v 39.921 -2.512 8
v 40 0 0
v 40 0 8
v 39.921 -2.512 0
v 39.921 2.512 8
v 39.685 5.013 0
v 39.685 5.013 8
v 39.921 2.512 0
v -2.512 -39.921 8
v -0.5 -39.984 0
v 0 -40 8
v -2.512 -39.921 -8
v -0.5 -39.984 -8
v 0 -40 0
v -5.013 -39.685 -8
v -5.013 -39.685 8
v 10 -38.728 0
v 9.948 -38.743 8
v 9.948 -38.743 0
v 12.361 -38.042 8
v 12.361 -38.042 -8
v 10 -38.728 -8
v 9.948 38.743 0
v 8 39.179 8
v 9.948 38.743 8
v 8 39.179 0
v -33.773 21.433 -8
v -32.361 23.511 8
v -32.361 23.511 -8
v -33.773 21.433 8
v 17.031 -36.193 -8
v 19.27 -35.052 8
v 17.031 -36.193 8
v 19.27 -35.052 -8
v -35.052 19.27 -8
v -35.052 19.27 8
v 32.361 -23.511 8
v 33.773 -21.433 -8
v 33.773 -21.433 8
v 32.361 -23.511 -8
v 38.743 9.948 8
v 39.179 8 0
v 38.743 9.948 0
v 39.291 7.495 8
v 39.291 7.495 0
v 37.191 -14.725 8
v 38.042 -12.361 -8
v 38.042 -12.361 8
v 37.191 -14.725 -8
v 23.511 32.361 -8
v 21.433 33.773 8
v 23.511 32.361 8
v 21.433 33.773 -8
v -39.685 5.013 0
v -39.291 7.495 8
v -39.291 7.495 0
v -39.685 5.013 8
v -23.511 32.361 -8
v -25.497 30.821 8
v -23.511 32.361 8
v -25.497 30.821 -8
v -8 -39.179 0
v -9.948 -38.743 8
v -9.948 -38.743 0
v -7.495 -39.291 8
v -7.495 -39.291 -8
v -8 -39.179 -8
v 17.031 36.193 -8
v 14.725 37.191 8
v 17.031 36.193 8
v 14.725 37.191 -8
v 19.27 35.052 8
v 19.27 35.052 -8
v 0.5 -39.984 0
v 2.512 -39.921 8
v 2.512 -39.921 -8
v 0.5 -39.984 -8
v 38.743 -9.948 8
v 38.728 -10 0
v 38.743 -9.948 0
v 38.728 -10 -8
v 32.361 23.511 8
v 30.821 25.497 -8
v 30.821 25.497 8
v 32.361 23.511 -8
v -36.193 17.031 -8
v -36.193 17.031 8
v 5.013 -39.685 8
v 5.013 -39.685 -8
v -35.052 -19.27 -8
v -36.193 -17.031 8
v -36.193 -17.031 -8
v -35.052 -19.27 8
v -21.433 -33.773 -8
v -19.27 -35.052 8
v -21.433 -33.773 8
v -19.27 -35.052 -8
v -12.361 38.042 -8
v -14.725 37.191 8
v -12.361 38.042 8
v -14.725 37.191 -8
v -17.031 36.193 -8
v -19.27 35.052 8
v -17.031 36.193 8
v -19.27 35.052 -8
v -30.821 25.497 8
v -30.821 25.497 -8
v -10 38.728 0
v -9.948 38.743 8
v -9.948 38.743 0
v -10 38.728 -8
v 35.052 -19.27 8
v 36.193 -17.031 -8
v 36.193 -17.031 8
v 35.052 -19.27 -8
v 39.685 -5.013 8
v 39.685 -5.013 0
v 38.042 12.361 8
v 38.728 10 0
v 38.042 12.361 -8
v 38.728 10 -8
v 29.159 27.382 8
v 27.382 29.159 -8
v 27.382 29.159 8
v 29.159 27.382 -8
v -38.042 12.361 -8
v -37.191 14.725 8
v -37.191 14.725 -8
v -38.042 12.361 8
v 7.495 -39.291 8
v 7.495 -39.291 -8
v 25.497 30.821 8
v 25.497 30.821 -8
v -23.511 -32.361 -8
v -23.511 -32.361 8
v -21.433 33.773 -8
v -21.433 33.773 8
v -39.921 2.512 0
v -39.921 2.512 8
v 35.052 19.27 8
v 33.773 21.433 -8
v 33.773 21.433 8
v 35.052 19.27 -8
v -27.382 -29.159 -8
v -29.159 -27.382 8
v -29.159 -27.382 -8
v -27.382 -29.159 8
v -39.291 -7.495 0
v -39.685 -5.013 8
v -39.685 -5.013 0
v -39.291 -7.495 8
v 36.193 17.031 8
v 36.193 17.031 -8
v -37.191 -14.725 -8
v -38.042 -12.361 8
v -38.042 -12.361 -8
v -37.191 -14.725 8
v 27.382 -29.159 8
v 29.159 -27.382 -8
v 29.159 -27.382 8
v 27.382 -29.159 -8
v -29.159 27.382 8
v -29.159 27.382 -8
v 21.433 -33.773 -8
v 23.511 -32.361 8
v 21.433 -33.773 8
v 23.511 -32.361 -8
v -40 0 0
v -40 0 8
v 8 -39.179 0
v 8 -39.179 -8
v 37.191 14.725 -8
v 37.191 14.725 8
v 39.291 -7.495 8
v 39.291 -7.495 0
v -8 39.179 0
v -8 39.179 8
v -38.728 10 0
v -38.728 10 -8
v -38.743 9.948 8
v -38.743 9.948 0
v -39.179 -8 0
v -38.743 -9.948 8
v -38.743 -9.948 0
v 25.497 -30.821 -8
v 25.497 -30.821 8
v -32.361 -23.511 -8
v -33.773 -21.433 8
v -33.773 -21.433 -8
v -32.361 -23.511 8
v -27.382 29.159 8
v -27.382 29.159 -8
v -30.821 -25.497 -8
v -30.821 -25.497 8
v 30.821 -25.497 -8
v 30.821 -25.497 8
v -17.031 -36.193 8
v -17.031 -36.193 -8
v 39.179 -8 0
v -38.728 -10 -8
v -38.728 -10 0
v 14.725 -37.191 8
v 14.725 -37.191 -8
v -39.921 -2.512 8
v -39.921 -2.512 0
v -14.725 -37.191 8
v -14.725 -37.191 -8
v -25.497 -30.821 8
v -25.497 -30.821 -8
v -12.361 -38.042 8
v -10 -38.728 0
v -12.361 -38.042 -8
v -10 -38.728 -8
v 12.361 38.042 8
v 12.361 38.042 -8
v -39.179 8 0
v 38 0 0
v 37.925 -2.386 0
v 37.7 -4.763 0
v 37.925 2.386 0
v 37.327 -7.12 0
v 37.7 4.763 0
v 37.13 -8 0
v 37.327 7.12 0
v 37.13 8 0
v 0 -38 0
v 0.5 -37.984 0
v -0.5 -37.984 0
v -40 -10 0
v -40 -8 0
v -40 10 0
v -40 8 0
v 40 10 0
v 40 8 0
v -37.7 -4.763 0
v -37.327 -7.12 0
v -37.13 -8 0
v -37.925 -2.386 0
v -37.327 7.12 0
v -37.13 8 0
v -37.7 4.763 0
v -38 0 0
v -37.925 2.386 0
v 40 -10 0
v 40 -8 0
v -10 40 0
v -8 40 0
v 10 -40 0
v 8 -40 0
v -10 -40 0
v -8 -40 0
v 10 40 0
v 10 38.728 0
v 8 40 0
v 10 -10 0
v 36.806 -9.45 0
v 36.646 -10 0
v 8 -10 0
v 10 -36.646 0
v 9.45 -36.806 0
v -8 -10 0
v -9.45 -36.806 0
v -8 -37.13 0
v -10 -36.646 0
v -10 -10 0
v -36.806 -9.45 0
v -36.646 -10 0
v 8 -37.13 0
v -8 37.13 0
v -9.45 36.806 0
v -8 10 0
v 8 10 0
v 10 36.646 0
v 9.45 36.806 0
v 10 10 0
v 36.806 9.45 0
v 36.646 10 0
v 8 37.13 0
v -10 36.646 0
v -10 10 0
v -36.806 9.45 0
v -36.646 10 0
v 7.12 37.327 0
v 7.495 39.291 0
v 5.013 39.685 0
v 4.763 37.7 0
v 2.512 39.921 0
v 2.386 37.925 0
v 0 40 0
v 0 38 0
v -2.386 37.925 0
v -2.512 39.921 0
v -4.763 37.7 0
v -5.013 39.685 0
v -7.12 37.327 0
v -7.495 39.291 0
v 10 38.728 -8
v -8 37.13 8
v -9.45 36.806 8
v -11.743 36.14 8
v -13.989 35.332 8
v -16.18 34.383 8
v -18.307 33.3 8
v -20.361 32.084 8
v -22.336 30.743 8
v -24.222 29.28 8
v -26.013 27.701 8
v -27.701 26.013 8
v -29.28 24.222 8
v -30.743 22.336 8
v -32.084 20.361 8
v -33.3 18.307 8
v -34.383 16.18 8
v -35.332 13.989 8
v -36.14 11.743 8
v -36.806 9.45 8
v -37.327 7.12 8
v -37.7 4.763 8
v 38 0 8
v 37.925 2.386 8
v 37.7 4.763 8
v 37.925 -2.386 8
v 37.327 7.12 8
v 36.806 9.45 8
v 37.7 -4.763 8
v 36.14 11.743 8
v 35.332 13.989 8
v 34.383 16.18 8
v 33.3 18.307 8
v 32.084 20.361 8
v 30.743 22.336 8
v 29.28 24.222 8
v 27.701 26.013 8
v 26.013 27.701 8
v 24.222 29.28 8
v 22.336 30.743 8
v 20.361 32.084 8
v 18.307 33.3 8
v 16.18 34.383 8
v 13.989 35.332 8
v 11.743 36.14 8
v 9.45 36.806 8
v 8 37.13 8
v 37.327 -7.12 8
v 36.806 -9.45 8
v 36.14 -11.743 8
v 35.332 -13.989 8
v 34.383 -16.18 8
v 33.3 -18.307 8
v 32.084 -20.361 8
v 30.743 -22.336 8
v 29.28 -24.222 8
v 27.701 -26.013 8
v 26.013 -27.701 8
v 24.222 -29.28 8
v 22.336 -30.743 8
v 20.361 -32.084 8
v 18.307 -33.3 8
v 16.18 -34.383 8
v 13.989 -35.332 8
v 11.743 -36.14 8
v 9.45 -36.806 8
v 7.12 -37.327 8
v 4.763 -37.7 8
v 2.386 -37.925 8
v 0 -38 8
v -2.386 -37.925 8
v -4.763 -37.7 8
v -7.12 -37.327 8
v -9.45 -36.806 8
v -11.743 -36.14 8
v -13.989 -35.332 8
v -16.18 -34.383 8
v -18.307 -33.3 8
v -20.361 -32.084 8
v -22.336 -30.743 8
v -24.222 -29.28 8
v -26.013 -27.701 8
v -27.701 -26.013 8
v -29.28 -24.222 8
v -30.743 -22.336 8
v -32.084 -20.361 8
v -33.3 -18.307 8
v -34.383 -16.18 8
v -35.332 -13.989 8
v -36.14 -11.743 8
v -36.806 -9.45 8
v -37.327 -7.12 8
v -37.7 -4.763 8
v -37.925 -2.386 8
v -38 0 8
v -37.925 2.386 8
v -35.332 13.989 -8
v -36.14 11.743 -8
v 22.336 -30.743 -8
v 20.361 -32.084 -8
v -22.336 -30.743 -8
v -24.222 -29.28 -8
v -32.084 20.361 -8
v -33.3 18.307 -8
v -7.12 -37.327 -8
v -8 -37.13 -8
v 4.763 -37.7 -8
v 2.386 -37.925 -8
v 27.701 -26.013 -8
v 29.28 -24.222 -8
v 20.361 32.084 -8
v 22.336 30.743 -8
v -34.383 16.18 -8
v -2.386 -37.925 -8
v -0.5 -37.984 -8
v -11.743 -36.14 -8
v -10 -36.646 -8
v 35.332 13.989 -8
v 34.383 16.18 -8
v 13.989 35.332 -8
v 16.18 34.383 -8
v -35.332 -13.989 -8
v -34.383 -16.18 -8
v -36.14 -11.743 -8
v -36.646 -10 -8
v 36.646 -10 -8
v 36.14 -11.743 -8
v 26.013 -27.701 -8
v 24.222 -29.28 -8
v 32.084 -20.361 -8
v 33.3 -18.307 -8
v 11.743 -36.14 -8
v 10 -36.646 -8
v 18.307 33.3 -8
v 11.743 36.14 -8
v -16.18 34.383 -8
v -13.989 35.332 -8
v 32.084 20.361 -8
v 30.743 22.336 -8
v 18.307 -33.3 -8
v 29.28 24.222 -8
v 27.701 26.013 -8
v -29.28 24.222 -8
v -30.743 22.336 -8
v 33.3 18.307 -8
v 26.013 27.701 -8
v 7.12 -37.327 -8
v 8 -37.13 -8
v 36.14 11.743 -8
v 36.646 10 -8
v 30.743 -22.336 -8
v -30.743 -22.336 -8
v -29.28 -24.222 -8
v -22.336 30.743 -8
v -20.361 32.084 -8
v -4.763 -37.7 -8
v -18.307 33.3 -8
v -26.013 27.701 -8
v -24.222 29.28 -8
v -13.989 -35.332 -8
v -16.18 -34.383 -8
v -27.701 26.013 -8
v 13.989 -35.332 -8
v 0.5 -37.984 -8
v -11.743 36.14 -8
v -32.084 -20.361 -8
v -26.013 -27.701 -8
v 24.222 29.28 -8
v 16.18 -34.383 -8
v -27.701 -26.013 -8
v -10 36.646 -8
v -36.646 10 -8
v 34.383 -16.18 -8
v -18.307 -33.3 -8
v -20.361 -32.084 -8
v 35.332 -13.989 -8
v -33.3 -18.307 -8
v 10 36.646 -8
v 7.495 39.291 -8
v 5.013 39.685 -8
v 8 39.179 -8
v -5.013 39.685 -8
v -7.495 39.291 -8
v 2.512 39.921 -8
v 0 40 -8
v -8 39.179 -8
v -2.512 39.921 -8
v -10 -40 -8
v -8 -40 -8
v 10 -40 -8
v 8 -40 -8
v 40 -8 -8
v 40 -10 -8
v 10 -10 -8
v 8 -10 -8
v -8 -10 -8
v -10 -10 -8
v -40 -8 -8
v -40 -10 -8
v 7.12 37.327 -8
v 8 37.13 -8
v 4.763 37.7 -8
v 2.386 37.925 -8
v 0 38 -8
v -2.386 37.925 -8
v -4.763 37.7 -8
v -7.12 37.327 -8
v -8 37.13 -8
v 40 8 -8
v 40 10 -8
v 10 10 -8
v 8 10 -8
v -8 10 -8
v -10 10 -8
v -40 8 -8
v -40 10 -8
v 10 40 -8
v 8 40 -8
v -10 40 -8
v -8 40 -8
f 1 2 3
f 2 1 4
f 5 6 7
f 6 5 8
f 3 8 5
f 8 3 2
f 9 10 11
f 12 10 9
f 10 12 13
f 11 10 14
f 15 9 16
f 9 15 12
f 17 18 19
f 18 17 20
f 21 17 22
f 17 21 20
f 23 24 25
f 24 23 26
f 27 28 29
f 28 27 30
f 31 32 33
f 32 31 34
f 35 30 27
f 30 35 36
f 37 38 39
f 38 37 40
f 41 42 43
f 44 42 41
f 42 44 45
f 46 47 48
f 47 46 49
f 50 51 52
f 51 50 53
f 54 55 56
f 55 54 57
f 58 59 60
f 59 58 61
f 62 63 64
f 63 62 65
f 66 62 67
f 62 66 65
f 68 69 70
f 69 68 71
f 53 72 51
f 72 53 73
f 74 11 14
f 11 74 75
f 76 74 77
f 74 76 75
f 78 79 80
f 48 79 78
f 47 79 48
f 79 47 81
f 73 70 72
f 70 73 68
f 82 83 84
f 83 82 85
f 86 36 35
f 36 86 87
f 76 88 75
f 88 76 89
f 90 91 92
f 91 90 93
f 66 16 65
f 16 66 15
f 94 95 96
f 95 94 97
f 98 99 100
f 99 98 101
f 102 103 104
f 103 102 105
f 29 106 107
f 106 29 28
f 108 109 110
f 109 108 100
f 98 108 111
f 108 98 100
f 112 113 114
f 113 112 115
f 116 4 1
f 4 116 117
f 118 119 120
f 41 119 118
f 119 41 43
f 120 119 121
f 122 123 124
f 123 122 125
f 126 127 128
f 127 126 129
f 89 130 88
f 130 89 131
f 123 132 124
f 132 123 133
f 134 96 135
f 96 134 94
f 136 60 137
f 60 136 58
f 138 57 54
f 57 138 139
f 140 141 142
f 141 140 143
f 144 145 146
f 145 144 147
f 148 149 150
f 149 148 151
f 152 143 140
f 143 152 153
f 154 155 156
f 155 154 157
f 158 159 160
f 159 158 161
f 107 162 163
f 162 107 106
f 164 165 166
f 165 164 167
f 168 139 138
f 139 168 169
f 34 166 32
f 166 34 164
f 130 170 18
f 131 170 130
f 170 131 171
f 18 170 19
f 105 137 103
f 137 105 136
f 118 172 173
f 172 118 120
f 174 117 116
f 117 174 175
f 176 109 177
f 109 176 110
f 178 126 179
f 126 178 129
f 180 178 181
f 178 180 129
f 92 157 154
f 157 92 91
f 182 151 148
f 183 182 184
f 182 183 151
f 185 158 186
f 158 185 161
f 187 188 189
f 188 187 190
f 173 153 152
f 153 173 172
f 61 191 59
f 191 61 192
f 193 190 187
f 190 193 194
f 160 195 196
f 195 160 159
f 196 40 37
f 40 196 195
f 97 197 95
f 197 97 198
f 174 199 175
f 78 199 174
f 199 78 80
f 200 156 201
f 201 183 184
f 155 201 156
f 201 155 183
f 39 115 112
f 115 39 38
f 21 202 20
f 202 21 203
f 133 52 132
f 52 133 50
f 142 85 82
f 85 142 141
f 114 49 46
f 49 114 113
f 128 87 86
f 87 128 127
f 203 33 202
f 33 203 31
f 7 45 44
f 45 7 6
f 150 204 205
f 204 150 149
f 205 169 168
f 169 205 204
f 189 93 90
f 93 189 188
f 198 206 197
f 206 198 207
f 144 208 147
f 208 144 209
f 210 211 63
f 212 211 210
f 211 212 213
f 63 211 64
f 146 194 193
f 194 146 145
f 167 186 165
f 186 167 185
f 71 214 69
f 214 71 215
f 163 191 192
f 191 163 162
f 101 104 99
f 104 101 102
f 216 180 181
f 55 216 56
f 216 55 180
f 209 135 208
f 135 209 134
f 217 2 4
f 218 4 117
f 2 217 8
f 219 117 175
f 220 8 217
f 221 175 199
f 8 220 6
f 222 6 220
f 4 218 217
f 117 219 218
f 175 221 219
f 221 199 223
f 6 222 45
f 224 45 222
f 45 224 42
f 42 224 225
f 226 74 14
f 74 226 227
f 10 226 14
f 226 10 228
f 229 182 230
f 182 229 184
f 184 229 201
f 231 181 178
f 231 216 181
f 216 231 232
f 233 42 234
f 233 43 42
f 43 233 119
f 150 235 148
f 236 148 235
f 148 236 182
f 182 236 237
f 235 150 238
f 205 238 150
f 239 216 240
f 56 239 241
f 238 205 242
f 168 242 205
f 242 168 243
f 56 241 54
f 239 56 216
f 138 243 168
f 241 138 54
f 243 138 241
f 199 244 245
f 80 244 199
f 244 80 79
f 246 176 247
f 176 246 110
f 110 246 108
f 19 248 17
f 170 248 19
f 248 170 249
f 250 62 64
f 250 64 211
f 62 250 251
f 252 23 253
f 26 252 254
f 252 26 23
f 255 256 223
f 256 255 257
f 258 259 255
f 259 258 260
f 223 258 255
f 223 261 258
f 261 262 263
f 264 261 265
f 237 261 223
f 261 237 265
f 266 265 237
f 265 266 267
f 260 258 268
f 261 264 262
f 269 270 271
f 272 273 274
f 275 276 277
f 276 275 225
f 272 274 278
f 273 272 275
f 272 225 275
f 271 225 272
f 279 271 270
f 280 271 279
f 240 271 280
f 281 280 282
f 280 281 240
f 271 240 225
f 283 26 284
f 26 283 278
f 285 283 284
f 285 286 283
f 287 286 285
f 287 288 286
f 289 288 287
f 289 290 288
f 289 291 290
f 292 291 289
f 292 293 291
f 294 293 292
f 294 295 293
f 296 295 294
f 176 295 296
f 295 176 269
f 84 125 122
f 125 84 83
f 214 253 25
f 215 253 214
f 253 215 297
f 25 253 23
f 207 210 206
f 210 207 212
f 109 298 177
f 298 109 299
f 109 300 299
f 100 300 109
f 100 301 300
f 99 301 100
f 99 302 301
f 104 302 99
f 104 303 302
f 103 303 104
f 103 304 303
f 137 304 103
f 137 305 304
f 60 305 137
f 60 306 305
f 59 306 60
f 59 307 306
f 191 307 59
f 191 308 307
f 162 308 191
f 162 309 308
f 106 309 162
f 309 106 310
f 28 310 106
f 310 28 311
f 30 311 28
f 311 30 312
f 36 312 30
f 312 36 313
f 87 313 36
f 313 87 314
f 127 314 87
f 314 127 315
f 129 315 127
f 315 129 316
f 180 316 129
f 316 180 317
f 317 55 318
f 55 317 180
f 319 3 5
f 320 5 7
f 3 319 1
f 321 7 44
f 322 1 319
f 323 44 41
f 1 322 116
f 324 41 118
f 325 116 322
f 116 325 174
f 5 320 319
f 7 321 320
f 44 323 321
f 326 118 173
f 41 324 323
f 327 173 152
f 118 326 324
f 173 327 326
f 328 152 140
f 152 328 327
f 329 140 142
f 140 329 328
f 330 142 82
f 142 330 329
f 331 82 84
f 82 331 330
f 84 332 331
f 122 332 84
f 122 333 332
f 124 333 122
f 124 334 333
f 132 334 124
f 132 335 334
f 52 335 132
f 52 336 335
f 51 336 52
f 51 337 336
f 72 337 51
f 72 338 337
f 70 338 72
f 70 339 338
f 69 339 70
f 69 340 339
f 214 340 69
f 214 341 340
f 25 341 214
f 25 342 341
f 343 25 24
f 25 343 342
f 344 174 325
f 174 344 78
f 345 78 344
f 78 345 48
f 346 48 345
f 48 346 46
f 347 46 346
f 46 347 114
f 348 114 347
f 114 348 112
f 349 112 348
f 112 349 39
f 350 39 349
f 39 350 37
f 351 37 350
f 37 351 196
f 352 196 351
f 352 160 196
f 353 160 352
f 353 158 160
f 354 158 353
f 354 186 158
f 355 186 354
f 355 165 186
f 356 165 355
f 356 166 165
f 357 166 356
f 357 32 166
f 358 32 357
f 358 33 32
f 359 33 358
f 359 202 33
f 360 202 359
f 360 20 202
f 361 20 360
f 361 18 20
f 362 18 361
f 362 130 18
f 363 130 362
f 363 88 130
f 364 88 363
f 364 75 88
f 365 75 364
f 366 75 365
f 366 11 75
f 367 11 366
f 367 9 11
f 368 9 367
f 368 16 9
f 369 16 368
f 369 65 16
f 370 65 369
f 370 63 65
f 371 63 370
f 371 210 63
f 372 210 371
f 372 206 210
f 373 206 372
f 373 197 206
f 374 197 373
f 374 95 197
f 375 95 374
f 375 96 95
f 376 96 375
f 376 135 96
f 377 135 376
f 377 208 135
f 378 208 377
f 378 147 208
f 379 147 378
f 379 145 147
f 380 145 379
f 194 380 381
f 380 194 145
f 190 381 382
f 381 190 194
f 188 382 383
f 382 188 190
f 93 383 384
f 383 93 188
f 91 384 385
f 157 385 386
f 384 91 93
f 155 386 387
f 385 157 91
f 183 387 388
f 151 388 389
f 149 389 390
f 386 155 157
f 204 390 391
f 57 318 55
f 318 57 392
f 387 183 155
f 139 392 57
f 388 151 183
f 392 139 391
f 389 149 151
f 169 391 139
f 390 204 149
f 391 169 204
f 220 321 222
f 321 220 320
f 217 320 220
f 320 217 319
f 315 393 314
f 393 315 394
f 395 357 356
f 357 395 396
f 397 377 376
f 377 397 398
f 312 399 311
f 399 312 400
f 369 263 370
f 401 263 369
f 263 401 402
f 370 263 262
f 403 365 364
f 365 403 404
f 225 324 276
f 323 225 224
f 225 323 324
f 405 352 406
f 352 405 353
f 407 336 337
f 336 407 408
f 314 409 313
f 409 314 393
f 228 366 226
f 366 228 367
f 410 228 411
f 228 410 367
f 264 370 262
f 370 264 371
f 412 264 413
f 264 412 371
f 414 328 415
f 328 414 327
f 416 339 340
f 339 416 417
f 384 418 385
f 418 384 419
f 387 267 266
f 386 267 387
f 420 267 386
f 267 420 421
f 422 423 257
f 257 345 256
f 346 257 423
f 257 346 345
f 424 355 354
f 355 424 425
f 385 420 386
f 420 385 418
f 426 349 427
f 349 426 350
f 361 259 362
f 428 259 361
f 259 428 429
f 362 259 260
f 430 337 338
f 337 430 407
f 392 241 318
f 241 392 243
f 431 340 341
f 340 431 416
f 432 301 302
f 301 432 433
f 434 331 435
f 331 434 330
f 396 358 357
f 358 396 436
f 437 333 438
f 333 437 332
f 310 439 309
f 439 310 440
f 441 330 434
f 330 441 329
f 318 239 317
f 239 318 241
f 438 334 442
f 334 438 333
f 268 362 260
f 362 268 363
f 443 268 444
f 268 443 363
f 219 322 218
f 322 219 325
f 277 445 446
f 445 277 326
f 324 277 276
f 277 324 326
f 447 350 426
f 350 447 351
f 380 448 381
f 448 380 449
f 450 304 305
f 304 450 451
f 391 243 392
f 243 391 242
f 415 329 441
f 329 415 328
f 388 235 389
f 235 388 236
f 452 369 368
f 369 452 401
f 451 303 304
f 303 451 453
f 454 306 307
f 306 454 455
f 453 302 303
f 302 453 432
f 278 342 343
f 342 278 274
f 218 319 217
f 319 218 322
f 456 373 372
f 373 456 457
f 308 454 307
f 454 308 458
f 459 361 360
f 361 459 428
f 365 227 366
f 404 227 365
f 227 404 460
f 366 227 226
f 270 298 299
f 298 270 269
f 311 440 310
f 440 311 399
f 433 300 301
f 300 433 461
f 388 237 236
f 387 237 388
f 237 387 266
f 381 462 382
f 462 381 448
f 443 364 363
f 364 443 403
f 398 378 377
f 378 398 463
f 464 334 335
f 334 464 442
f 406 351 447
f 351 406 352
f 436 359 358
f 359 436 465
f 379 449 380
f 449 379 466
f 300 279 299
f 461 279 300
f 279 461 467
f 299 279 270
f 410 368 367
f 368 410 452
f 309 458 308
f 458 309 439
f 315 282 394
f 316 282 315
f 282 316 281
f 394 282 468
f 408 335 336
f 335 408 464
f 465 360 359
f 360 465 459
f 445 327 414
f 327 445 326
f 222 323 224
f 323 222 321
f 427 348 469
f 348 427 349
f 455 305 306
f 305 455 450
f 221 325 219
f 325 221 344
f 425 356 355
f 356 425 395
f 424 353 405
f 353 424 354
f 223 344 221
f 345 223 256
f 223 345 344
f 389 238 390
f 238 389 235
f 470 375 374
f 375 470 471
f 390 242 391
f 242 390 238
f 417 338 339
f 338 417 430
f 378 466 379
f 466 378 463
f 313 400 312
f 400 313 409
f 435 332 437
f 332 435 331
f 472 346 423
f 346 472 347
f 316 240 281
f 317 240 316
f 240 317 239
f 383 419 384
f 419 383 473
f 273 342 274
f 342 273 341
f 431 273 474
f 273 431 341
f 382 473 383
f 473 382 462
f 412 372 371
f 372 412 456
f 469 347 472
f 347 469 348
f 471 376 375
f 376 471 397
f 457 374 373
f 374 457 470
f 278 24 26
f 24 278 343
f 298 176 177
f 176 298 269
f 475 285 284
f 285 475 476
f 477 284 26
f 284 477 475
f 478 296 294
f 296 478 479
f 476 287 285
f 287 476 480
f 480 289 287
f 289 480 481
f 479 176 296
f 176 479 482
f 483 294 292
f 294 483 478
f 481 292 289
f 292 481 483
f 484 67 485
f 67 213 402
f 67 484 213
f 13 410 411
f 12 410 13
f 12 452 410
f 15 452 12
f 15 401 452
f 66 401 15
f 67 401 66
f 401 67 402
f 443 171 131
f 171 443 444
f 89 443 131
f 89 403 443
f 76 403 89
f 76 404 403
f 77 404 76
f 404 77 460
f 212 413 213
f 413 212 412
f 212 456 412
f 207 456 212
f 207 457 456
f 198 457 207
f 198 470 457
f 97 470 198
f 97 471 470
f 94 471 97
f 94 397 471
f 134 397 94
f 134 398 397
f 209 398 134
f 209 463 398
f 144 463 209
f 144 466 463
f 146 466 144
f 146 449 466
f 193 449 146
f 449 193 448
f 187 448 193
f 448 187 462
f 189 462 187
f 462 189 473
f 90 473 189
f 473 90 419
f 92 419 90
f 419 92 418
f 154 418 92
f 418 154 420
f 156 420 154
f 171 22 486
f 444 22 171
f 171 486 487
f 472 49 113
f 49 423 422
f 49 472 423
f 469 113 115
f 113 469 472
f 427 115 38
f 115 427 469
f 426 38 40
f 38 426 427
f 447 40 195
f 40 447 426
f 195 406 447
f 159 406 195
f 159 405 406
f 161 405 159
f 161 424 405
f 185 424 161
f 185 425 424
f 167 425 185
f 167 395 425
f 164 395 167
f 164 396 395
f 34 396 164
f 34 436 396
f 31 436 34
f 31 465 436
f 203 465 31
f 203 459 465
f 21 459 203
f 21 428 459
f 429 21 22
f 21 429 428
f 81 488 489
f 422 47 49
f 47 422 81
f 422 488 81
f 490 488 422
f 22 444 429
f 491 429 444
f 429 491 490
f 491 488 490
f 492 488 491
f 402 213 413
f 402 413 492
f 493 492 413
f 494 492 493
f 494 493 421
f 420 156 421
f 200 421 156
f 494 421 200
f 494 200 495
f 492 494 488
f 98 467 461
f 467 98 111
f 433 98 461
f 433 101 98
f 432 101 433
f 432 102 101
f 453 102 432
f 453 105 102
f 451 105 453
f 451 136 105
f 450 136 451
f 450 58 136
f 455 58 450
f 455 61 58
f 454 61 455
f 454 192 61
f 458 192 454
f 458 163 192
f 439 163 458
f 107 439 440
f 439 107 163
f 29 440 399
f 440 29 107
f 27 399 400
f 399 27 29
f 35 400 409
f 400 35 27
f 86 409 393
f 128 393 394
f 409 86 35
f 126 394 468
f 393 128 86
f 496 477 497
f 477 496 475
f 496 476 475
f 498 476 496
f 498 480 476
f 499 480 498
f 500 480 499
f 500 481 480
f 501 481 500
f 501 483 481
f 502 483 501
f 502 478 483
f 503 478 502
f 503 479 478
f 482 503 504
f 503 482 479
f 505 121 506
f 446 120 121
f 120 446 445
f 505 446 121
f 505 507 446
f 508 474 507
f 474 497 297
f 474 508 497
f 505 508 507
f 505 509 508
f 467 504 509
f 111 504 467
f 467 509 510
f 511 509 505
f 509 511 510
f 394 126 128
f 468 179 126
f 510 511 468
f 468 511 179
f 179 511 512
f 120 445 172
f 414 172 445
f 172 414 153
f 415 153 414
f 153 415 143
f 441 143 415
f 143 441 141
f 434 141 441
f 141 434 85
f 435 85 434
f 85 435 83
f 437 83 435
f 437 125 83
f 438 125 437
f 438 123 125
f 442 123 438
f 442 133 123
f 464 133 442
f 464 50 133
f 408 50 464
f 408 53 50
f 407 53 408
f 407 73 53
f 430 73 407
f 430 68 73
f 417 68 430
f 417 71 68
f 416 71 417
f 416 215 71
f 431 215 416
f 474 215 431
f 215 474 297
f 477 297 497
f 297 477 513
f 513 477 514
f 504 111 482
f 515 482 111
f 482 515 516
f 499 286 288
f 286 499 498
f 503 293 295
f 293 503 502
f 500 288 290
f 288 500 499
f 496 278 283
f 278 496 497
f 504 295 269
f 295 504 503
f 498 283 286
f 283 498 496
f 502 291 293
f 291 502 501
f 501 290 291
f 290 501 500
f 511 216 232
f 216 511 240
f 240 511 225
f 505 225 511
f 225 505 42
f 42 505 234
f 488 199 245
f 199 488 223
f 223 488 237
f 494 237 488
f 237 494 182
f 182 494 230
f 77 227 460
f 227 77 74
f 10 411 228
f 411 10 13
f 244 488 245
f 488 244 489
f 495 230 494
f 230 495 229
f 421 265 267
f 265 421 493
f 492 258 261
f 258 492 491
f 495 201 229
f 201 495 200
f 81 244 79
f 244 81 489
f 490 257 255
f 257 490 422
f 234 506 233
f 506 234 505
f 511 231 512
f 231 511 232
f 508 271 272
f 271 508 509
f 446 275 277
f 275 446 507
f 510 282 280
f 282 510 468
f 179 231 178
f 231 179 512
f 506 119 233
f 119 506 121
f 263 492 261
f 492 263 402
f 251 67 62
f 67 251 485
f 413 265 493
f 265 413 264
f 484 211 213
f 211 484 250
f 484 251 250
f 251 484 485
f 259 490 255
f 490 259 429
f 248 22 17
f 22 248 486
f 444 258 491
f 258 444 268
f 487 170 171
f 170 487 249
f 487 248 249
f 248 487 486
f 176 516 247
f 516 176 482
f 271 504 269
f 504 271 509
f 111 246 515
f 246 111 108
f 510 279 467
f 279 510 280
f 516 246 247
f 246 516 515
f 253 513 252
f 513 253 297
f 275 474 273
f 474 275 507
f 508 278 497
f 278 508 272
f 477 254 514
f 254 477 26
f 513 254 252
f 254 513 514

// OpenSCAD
//upper
difference(){
translate([0,0,4])cylinder(h=8,r=40,center=true,$fn=100);
translate([0,0,4])cylinder(h=9,r=38,center=true,$fn=100);
translate([0,40,4])cube([16,8,8],center=true);
}

//bottom
difference(){
translate([0,0,-4])cylinder(h=8,r=40,center=true,$fn=100);
translate([0,0,-4])cylinder(h=9,r=38,center=true,$fn=100);
translate([0,0,-4])cube([81,16,10],center=true);
translate([0,-40,-4])cube([1,5,10],center=true);
}

//#
translate([0,-9,-4])cube([80,2,8],center=true);
translate([0, 9,-4])cube([80,2,8],center=true);
translate([-9,-25,-4])cube([2,30,8],center=true);
translate([ 9,-25,-4])cube([2,30,8],center=true);
translate([-9, 25,-4])cube([2,30,8],center=true);
translate([ 9, 25,-4])cube([2,30,8],center=true);
